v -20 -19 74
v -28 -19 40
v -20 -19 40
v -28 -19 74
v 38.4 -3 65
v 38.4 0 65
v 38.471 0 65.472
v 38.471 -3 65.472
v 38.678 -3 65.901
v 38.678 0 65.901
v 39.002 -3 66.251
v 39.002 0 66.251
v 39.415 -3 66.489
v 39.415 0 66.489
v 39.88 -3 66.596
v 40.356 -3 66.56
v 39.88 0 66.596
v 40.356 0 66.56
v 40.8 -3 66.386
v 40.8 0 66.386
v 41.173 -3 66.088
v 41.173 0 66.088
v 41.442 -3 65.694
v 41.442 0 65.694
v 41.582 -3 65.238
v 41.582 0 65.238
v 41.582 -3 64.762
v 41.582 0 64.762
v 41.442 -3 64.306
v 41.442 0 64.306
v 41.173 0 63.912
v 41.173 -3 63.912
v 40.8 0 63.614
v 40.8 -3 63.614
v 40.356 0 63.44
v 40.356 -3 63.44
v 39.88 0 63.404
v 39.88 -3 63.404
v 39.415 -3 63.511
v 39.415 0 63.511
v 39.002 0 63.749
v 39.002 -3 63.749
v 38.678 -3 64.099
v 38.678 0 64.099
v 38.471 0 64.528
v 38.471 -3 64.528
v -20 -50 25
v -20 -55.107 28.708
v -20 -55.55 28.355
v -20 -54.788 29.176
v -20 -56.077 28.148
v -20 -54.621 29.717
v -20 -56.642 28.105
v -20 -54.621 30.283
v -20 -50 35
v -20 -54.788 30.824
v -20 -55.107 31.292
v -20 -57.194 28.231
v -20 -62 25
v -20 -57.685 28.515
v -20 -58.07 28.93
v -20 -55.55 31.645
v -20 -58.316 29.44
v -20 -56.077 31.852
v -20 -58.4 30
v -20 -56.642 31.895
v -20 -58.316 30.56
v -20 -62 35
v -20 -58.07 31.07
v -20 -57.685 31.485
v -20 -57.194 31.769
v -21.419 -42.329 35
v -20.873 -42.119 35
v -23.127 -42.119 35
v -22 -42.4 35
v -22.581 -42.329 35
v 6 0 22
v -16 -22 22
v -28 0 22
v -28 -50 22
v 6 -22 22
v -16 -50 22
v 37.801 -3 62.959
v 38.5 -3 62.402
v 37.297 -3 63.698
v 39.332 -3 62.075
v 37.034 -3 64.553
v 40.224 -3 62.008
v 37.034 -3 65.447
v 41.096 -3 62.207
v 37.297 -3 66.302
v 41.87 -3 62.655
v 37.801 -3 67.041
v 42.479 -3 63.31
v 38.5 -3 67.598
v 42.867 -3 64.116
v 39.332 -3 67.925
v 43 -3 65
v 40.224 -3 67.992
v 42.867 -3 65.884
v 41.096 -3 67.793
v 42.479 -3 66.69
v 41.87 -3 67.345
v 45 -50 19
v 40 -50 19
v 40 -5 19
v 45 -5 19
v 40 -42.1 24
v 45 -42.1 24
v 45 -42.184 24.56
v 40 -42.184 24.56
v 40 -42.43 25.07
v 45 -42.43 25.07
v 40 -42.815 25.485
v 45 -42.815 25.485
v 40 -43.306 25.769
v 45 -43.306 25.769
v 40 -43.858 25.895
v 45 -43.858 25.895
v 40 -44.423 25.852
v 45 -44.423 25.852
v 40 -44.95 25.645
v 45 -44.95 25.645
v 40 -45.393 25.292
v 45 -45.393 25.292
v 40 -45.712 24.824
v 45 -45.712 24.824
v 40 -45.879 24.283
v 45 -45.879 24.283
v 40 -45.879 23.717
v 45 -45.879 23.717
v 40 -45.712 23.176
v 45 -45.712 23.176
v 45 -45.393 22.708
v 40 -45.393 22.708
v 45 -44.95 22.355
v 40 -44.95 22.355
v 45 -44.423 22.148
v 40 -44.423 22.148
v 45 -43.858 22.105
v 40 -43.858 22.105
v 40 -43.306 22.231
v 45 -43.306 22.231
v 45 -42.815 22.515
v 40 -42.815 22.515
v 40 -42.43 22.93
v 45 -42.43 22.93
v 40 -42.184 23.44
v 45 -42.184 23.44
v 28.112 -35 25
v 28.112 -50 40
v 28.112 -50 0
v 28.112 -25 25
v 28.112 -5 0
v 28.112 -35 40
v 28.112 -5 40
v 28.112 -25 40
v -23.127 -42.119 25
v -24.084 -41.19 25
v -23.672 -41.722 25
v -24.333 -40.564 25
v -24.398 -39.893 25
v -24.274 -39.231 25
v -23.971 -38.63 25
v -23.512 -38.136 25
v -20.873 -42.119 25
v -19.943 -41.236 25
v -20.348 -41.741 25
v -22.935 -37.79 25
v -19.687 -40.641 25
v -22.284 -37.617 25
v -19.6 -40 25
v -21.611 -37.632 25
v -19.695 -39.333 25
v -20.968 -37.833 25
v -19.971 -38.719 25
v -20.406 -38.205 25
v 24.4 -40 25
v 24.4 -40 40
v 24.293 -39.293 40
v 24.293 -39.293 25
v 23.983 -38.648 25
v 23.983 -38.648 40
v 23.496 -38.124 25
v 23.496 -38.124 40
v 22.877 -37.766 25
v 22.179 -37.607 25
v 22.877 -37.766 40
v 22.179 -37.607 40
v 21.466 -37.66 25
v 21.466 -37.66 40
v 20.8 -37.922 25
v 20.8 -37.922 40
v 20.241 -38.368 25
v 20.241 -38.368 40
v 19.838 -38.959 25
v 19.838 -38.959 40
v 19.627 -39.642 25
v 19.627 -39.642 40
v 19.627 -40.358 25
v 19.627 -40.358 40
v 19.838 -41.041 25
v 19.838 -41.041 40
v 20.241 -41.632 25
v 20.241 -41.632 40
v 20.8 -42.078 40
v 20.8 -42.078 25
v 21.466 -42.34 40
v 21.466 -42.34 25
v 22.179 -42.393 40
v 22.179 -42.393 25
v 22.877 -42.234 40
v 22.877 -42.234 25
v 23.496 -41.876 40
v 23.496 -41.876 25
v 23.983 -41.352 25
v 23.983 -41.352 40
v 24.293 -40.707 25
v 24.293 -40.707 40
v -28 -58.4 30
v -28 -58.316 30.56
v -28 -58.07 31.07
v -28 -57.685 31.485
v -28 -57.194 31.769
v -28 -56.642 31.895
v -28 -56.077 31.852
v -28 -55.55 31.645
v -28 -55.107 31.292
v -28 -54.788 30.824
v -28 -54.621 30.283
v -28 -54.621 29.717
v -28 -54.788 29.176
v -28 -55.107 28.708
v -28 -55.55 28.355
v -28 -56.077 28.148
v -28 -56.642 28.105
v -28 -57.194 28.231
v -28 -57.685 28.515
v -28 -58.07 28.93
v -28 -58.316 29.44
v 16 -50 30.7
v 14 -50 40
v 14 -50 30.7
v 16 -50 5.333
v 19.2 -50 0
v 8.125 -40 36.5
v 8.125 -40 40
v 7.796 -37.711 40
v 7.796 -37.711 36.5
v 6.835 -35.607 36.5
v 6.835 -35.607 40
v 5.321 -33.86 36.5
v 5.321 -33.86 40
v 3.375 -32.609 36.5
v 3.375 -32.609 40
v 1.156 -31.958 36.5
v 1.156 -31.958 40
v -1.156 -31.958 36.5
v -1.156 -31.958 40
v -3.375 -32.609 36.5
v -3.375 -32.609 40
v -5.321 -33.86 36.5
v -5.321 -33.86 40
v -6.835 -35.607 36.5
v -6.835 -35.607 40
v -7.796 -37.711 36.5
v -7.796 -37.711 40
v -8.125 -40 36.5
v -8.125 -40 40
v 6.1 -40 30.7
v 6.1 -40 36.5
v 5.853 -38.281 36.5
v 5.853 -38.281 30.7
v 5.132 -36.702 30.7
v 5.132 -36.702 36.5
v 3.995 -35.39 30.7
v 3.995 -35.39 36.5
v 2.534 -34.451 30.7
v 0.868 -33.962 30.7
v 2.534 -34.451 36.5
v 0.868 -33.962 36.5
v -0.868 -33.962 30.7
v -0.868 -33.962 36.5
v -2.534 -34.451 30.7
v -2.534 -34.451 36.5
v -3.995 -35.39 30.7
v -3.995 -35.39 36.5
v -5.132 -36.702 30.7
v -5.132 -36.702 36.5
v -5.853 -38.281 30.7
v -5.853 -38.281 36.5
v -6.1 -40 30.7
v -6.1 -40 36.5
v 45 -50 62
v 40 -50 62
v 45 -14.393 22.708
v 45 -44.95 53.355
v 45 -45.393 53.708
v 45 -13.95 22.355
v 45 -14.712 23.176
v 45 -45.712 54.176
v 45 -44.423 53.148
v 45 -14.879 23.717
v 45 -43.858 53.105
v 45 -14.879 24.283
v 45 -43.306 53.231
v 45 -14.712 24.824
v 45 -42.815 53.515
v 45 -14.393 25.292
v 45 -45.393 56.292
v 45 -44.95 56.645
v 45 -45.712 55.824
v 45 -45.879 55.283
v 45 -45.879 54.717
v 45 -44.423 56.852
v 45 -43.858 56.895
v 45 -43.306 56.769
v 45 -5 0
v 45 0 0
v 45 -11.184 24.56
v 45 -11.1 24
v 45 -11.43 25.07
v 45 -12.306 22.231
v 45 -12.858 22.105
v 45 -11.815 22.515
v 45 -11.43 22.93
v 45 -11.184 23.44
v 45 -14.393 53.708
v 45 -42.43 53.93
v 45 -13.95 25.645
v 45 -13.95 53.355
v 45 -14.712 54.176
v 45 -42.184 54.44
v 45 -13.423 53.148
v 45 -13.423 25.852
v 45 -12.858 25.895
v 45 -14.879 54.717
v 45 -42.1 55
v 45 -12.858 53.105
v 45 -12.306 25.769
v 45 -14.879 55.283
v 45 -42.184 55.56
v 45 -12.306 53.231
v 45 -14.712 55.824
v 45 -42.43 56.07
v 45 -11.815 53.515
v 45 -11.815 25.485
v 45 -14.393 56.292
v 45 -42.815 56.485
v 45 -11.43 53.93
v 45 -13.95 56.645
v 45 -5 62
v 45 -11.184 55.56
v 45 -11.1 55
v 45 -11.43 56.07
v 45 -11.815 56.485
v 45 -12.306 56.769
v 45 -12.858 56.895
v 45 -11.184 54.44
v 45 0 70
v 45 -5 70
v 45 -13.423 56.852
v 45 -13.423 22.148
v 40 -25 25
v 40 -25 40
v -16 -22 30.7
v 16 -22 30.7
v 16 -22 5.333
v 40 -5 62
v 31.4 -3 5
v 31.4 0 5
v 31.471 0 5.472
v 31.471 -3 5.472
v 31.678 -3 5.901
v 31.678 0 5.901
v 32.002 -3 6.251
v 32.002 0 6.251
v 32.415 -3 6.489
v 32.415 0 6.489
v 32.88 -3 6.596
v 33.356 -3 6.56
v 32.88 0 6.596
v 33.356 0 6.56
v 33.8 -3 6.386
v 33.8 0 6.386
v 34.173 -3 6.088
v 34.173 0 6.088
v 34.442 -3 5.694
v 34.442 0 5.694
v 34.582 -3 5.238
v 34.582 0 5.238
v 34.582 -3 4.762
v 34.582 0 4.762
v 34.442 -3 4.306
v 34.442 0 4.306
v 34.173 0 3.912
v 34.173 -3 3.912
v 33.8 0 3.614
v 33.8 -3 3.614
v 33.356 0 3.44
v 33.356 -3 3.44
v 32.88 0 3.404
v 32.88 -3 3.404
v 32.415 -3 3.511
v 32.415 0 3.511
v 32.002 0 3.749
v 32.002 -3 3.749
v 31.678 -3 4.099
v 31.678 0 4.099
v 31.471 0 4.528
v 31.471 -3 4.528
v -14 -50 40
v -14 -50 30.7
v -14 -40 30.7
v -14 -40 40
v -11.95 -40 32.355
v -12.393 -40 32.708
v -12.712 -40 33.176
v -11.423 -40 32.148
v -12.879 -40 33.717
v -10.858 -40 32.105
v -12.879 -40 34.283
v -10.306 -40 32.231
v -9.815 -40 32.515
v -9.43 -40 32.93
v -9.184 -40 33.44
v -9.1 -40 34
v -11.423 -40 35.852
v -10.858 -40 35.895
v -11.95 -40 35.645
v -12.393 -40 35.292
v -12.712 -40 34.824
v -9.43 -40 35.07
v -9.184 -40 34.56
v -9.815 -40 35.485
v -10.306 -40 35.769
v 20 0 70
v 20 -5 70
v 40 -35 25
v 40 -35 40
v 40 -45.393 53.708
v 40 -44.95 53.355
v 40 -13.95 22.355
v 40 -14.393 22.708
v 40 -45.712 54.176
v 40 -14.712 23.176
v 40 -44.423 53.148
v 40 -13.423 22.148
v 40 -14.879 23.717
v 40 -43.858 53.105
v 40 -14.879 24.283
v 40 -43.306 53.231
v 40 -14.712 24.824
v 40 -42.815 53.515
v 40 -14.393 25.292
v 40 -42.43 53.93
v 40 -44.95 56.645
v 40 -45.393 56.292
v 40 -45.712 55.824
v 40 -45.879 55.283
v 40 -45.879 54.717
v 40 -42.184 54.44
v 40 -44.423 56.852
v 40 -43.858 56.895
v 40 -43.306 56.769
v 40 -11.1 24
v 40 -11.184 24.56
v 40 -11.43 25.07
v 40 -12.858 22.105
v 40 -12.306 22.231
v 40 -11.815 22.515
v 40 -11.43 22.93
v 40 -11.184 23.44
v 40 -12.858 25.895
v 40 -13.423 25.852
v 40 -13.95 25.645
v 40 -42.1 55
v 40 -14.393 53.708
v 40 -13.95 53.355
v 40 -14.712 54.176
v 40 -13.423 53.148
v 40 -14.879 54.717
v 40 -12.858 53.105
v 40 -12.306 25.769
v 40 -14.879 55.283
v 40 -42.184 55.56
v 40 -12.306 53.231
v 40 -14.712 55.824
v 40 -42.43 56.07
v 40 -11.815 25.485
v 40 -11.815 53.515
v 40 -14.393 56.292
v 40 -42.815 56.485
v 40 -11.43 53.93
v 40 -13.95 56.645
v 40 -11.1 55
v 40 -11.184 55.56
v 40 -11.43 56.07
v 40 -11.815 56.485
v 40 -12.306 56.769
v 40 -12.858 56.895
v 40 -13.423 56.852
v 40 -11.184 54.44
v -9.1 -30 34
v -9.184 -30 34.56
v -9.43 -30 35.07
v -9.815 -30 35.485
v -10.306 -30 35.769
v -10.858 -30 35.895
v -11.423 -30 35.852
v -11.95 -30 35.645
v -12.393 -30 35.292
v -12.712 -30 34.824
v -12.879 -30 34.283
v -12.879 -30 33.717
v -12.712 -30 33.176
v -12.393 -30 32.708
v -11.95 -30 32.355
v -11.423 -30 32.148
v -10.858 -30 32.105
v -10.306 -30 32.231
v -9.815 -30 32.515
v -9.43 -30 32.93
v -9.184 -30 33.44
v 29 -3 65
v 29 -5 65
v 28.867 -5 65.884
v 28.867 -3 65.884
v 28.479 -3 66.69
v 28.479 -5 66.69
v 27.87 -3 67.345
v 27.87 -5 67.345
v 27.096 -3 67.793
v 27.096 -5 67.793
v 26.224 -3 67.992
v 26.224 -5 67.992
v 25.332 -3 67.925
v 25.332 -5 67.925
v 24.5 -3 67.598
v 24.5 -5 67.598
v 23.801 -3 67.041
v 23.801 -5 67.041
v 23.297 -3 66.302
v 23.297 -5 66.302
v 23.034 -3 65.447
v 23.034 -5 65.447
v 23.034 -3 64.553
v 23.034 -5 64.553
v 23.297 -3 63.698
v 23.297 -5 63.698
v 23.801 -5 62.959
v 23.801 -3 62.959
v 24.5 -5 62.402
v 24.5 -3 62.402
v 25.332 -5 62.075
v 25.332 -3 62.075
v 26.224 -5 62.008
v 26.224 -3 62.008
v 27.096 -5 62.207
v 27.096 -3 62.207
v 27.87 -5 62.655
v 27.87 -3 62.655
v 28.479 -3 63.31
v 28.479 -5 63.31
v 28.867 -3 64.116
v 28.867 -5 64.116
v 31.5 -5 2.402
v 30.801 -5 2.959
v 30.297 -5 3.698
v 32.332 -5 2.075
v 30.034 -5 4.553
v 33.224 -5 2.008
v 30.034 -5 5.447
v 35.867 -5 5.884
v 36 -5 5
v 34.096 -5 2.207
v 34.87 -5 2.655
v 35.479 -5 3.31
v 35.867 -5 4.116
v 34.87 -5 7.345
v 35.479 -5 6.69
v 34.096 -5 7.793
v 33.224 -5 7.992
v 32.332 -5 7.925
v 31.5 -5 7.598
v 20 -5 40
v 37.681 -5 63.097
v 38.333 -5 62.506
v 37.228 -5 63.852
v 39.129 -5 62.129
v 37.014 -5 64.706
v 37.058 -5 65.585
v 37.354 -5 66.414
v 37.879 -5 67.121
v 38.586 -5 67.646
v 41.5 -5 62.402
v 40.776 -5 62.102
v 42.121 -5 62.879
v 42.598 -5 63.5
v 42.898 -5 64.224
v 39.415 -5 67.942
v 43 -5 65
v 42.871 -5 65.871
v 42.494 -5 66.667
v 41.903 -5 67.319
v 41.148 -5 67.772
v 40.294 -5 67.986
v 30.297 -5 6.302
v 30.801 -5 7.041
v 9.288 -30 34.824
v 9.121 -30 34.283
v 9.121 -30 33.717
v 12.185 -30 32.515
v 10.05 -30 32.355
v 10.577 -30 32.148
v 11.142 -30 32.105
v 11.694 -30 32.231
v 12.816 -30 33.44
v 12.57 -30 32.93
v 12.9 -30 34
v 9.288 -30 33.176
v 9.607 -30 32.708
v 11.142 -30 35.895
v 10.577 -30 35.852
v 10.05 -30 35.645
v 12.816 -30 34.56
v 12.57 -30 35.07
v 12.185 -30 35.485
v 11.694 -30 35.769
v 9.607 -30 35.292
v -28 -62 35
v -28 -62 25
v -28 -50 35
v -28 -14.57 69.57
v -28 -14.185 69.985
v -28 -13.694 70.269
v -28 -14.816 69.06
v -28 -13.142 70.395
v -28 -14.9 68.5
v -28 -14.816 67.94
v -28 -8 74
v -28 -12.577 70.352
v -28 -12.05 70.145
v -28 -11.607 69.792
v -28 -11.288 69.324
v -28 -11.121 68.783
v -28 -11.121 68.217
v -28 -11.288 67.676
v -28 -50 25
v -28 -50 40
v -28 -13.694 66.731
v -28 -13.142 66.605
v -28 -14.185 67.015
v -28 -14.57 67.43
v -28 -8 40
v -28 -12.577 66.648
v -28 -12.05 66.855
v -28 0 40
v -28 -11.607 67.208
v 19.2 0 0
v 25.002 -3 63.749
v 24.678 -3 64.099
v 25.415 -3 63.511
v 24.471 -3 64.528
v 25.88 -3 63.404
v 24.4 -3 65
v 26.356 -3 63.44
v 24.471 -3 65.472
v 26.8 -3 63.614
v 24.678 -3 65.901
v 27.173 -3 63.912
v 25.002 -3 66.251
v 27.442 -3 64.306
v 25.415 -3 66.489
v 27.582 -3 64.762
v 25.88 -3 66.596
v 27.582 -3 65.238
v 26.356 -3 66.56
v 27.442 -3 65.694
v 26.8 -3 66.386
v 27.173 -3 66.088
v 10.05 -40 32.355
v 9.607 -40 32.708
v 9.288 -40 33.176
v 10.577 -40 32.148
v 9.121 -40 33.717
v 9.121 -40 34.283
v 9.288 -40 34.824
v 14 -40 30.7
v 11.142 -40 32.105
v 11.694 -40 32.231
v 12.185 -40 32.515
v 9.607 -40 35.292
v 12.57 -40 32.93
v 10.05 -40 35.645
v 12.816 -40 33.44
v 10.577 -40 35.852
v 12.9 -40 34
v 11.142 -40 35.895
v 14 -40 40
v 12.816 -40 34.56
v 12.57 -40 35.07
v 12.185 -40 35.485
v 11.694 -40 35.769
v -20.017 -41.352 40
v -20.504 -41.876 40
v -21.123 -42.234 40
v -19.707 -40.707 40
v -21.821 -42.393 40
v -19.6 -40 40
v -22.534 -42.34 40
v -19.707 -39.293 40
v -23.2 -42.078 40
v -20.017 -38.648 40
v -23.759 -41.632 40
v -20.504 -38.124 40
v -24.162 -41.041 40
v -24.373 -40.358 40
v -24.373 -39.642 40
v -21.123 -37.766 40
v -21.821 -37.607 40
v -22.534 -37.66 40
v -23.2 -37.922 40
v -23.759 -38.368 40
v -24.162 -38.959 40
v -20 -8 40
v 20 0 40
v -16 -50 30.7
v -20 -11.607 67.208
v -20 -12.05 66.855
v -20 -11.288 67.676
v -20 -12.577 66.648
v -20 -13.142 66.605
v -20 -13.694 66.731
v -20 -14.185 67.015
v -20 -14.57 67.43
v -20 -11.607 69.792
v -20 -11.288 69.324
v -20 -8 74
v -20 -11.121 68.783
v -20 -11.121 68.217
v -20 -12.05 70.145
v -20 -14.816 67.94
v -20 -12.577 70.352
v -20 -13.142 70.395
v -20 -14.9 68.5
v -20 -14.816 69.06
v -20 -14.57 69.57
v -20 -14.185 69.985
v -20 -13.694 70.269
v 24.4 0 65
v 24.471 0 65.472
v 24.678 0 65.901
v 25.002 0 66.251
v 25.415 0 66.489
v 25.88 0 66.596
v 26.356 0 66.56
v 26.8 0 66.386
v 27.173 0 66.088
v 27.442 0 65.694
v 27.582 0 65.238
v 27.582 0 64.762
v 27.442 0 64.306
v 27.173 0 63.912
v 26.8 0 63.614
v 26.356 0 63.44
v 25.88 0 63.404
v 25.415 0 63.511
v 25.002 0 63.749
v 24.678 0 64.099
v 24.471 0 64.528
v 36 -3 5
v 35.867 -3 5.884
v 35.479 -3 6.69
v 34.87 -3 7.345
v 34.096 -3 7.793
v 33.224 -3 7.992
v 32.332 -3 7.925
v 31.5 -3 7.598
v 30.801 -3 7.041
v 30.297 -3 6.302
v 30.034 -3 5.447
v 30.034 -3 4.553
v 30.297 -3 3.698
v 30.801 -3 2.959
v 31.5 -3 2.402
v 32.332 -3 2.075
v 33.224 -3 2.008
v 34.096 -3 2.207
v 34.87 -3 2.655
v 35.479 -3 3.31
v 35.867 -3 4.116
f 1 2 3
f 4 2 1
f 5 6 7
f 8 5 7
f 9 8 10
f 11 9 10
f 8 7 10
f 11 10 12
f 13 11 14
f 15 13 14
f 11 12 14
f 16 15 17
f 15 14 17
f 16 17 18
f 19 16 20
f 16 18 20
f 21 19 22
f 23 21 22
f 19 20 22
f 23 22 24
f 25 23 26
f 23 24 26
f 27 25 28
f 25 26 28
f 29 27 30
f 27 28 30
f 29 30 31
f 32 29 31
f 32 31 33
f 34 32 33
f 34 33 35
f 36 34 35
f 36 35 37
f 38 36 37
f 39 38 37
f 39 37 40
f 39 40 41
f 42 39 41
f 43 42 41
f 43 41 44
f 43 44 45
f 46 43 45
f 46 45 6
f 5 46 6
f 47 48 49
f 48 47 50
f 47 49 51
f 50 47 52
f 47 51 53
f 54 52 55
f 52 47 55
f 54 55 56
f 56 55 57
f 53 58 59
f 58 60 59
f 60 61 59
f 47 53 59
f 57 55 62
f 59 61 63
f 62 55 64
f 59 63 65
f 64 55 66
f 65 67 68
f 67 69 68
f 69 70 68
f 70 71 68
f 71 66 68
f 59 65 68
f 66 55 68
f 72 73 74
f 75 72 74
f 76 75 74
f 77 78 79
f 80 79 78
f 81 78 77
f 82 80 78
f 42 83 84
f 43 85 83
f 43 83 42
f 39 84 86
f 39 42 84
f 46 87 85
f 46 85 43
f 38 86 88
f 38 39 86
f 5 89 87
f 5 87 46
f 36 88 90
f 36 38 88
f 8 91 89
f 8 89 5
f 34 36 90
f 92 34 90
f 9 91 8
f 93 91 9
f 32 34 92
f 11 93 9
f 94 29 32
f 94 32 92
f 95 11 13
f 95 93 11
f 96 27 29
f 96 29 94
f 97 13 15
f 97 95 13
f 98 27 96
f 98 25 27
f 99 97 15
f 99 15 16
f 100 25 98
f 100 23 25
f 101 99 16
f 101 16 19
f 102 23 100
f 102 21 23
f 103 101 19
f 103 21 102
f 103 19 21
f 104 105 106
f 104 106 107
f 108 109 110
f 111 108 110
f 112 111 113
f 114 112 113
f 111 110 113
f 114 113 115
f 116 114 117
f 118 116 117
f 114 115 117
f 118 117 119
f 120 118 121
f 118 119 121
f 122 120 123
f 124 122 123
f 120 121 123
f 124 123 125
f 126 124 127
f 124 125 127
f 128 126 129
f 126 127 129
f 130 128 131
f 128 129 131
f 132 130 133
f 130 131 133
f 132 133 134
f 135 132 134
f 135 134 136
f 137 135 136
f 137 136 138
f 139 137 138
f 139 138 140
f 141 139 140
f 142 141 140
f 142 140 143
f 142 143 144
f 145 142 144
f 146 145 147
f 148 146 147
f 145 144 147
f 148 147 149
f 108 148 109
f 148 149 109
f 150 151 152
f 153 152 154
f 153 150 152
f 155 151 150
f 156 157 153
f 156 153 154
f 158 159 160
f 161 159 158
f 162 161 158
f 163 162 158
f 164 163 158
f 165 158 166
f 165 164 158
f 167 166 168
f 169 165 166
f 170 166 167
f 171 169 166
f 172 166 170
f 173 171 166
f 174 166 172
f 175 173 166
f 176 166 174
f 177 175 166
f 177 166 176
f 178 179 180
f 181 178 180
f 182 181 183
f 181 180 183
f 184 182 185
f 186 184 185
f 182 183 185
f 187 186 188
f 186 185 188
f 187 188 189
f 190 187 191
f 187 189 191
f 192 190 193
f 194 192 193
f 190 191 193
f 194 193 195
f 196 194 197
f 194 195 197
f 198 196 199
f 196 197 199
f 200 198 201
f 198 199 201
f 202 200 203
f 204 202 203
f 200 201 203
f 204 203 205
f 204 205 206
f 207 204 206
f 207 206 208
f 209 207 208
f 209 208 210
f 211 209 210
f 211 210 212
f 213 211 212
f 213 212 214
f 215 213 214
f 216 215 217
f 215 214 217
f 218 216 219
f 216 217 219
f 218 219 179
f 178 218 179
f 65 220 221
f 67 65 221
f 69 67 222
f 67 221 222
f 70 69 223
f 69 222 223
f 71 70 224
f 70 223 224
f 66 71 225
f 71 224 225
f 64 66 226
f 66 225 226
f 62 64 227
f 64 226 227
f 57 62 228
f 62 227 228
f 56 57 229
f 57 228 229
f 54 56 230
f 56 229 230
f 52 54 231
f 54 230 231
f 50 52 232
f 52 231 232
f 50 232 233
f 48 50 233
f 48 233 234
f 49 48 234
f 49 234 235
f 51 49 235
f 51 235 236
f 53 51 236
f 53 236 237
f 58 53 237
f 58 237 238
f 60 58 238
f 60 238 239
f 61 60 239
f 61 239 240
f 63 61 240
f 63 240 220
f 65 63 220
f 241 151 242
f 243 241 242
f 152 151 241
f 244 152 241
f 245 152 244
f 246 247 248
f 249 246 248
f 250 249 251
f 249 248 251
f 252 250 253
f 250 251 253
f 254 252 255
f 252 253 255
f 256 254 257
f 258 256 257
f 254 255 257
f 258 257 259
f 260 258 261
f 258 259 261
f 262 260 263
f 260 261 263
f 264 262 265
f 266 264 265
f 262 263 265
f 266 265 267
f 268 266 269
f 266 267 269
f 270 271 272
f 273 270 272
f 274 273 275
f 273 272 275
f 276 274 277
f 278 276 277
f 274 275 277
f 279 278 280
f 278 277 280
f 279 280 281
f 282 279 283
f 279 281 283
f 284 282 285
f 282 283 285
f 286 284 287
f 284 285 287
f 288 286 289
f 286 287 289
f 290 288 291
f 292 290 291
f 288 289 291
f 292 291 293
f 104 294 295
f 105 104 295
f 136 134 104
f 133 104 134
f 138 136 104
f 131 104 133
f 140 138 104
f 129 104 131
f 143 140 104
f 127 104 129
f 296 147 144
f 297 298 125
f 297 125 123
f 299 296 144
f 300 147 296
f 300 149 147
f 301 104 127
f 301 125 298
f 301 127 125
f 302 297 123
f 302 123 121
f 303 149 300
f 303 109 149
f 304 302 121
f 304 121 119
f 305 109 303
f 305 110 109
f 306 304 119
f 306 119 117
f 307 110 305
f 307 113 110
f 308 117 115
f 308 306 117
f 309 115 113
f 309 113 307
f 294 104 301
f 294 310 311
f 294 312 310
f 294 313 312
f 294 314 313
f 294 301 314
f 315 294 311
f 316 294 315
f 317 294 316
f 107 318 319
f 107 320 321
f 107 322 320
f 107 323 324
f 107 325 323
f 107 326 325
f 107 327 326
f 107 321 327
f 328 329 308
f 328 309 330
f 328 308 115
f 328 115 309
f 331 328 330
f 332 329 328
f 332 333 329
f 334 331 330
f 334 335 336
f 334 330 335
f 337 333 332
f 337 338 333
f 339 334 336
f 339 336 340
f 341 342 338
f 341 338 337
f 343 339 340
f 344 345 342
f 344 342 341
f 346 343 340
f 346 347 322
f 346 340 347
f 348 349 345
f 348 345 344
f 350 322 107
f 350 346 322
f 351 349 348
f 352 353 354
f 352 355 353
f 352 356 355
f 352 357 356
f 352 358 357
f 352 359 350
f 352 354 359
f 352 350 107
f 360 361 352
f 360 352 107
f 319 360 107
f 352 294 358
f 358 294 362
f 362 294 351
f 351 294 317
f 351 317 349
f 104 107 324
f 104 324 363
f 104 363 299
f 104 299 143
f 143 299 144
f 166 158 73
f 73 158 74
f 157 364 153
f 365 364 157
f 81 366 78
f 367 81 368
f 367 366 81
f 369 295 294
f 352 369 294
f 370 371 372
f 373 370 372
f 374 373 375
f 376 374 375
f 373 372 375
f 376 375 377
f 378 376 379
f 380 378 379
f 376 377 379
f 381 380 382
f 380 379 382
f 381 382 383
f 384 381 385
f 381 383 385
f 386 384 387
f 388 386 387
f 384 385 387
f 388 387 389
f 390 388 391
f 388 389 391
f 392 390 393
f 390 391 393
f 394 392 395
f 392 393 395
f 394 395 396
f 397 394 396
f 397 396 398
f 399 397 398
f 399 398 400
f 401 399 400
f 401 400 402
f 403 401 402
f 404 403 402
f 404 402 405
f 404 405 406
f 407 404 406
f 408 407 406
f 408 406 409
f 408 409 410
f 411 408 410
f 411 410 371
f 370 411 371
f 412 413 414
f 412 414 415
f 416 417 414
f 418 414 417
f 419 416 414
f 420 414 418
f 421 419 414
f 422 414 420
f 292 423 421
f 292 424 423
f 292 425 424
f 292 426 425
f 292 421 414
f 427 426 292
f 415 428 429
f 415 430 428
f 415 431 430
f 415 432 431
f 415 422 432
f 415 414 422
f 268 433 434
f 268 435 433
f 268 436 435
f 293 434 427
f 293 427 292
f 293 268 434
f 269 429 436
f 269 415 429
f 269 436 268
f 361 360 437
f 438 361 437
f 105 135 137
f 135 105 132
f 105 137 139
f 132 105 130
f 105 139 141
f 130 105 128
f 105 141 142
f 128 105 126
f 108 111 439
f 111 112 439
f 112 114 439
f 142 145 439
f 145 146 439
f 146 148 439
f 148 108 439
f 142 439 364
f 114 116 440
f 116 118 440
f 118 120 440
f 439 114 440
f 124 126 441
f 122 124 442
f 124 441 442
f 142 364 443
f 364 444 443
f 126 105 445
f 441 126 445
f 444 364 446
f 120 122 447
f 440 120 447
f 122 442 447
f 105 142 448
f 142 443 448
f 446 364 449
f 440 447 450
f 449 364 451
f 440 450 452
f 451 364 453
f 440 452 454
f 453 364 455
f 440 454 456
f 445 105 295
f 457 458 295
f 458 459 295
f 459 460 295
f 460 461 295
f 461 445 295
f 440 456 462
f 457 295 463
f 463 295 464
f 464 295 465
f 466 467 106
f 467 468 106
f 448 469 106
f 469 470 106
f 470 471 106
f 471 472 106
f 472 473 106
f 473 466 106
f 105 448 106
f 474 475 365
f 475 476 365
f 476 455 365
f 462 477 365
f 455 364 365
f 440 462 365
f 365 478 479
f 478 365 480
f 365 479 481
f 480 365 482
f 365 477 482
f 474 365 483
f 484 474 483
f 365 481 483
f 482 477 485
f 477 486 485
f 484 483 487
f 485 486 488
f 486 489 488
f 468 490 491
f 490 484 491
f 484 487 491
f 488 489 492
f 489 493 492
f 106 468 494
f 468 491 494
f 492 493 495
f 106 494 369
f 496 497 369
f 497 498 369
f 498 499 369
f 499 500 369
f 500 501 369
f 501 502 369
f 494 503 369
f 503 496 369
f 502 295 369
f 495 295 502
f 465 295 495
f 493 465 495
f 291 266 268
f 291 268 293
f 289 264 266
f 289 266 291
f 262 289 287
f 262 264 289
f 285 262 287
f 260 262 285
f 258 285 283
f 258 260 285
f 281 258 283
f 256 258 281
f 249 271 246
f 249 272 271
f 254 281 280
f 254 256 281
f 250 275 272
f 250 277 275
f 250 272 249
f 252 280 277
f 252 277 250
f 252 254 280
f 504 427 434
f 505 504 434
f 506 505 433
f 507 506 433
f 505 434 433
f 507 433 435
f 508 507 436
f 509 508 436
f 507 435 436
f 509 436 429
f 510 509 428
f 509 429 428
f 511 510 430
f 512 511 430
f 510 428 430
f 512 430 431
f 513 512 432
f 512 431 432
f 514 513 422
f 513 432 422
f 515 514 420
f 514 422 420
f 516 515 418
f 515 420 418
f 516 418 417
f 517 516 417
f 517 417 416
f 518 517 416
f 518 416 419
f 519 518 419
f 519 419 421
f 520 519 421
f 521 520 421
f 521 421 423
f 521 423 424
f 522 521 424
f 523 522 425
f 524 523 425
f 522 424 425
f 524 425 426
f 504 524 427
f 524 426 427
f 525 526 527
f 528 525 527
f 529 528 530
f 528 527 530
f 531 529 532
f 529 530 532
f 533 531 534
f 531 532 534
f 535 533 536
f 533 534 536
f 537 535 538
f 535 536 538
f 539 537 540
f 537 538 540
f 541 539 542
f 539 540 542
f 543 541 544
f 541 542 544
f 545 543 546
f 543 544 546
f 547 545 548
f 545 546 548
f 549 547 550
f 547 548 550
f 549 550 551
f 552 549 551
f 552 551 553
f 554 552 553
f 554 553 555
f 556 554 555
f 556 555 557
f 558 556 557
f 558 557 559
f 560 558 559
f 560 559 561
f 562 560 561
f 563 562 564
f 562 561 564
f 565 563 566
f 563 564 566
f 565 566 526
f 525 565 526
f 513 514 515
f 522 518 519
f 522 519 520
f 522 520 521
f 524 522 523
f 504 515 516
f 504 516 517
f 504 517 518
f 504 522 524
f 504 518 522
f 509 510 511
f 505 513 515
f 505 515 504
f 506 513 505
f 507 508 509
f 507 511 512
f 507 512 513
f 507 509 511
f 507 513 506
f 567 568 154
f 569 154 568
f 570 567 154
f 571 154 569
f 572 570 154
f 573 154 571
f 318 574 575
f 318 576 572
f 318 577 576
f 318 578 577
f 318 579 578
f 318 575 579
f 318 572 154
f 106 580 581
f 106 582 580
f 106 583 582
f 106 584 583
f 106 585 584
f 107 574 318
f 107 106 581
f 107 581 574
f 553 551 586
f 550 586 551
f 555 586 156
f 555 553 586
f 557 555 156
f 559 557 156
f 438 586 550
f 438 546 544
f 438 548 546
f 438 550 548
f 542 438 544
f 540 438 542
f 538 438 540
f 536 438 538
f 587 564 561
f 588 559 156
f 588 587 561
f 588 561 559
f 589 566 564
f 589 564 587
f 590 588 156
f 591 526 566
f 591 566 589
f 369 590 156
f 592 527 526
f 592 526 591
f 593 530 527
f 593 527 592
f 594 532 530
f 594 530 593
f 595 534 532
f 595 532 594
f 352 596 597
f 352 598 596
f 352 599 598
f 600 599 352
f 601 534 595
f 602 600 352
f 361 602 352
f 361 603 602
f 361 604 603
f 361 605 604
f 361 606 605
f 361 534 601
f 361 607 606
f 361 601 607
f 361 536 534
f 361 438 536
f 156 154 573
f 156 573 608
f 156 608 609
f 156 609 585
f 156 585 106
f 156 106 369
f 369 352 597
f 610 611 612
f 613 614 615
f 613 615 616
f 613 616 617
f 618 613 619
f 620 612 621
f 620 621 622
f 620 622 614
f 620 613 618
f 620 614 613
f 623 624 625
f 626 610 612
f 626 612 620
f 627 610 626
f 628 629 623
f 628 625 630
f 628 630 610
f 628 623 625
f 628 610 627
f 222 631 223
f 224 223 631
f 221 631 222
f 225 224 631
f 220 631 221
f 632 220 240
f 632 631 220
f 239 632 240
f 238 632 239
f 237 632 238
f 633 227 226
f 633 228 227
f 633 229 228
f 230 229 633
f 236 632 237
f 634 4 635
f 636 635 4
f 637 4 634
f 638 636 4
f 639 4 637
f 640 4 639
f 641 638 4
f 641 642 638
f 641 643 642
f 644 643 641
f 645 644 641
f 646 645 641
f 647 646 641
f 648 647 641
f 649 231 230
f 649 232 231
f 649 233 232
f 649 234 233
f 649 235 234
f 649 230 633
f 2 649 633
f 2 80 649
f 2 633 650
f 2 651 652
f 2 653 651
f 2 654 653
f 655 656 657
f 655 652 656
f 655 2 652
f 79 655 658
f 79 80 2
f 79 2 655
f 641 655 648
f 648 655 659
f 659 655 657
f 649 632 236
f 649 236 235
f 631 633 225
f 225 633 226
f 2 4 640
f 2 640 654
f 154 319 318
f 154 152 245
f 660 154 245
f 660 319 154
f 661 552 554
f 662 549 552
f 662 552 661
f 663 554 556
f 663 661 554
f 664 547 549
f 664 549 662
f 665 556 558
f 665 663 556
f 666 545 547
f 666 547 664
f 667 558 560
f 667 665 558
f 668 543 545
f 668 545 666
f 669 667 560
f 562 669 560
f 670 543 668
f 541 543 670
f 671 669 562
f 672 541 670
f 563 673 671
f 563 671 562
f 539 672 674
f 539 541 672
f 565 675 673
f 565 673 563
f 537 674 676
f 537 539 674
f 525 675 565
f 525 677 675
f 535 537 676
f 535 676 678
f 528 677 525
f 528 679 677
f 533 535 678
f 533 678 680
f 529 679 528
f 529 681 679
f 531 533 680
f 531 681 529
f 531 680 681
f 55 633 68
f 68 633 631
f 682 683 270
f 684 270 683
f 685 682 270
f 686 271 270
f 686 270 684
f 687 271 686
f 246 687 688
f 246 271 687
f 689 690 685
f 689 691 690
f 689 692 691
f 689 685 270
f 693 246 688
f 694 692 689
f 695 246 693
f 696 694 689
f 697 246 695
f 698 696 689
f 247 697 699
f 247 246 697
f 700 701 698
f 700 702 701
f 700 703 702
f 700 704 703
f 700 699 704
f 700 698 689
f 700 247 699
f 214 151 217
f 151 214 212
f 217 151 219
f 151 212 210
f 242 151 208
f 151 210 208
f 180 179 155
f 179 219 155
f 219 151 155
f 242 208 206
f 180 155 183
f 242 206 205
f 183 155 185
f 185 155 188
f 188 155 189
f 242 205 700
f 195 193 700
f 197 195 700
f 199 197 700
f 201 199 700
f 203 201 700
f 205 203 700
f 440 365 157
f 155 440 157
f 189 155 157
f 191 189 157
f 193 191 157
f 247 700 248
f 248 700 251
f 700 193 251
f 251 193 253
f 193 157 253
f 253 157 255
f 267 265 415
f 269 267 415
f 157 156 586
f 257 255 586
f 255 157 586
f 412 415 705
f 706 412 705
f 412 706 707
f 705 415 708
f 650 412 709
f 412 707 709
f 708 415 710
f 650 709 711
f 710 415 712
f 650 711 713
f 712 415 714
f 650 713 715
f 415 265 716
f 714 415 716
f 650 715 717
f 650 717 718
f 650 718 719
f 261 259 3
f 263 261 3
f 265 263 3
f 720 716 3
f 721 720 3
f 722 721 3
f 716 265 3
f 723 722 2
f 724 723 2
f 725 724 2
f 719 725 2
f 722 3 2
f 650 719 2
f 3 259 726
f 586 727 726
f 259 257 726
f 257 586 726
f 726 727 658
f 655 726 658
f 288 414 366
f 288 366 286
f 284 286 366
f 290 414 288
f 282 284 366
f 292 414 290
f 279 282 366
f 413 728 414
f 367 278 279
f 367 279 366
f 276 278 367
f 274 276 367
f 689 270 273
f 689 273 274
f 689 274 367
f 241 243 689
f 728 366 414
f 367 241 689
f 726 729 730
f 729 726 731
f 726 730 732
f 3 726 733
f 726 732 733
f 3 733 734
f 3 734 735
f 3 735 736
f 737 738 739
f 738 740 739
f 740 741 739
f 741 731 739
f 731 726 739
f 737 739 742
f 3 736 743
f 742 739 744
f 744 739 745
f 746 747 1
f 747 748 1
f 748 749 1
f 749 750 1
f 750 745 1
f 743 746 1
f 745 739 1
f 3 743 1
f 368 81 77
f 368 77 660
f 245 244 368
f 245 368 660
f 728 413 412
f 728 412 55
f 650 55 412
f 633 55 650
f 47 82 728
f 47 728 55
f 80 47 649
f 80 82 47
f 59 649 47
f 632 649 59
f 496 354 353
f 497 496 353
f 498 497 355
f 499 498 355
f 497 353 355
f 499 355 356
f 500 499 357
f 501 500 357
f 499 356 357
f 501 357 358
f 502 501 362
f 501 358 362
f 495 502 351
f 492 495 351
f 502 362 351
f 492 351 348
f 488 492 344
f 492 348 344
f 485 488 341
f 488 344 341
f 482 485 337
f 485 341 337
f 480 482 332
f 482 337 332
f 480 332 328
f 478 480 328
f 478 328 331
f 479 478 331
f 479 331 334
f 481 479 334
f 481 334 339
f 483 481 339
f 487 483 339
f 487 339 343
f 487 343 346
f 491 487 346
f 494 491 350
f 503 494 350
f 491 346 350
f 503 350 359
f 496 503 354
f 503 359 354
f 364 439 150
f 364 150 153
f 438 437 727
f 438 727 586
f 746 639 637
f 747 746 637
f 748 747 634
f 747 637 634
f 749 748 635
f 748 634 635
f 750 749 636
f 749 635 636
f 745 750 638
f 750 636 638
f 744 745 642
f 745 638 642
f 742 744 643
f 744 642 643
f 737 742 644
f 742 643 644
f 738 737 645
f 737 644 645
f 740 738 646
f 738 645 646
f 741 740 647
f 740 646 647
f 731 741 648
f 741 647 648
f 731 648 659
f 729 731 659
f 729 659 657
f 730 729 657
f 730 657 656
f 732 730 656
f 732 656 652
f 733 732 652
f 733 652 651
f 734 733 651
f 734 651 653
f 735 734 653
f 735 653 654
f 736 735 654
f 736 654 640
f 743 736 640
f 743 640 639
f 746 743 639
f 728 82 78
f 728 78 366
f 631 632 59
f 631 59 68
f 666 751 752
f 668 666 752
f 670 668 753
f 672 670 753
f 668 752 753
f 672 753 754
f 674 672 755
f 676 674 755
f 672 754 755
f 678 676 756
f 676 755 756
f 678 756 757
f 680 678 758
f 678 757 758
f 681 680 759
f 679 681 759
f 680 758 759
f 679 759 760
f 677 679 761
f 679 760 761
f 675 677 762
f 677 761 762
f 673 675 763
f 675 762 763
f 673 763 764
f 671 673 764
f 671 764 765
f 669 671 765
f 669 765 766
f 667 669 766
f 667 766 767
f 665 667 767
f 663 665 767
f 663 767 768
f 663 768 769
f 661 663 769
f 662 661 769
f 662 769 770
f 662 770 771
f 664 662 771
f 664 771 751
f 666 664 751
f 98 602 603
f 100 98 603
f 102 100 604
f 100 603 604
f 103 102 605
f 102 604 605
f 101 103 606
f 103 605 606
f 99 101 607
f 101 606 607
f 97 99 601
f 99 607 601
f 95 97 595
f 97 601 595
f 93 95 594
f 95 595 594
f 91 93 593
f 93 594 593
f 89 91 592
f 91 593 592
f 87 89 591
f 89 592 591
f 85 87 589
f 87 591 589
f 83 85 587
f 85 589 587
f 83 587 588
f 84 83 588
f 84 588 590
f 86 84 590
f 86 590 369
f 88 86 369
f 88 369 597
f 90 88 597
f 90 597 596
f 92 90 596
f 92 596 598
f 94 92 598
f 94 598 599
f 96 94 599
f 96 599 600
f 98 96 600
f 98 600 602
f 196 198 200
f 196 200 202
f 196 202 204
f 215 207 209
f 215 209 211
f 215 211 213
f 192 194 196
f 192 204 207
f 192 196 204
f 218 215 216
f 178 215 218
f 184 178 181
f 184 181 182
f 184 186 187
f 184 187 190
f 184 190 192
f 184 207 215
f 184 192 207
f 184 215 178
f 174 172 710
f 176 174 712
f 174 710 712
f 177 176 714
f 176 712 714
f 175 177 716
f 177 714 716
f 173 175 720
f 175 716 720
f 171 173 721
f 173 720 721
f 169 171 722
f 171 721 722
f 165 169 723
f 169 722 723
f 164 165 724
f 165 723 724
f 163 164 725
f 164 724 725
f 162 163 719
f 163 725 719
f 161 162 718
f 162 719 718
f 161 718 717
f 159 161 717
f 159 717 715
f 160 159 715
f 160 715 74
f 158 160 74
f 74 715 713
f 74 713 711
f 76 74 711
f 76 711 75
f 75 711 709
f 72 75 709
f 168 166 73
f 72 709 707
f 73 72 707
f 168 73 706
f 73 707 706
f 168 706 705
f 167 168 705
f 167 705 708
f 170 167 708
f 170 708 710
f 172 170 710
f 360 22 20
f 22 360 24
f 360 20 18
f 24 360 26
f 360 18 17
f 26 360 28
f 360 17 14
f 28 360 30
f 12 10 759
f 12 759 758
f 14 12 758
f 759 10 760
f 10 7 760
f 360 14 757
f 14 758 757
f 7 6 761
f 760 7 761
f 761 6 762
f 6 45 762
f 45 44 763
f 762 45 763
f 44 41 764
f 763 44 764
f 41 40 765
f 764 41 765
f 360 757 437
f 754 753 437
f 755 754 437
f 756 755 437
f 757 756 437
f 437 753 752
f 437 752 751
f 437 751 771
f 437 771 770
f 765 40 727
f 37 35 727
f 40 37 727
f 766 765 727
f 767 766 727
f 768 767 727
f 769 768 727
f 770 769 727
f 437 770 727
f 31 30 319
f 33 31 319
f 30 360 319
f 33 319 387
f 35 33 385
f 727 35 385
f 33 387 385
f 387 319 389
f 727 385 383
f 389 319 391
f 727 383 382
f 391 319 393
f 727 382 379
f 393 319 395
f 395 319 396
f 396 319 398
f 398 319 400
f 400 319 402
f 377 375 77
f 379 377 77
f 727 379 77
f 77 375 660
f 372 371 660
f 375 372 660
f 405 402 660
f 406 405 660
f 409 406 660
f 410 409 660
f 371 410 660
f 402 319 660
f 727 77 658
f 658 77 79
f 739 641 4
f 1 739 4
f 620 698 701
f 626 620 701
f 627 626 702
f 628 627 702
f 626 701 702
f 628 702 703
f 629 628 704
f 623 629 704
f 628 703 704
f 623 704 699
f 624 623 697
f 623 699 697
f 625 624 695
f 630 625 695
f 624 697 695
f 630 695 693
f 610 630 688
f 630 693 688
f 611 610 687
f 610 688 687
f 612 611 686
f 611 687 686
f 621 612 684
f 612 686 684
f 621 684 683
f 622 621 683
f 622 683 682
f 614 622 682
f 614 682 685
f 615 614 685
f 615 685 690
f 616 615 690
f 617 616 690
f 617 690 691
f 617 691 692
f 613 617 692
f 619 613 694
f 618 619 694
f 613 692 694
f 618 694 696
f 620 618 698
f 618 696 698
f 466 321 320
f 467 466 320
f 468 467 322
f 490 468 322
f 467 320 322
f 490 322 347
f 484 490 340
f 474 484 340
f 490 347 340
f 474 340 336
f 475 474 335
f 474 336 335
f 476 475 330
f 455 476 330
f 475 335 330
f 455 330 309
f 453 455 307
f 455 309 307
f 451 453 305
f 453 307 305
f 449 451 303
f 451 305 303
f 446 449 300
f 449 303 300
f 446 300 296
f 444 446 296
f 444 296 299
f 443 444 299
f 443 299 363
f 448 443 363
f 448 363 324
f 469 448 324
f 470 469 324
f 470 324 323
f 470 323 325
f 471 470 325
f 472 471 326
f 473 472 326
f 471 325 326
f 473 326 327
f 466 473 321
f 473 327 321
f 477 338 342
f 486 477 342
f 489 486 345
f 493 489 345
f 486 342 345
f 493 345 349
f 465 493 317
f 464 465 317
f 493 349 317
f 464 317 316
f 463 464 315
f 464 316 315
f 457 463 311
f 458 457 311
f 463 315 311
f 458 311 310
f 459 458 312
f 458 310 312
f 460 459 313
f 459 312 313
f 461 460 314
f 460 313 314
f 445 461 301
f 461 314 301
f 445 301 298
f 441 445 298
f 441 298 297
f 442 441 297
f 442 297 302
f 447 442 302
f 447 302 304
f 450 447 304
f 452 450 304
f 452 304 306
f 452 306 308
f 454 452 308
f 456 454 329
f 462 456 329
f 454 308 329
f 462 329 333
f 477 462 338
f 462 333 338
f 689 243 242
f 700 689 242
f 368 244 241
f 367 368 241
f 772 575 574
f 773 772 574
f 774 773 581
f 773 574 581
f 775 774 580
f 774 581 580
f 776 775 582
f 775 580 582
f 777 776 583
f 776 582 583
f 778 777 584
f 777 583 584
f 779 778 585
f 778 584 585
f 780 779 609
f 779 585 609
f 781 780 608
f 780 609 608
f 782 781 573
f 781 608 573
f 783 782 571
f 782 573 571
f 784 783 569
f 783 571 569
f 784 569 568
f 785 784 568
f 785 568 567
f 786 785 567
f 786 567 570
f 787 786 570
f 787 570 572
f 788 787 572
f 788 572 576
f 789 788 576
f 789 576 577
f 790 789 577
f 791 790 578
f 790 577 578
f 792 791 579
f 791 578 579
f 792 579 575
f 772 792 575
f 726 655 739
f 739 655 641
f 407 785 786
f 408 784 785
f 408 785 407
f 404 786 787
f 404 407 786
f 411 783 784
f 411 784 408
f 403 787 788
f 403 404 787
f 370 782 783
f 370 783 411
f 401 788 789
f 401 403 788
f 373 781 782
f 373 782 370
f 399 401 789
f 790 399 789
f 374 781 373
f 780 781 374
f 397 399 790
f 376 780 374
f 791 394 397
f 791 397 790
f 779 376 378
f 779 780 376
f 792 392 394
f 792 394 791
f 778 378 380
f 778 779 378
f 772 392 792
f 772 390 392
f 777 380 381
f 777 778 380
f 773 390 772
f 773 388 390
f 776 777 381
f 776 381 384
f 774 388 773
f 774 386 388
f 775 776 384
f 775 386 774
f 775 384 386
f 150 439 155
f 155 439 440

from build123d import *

# Parameters (mm, degrees)
PAD_DEPTH       = 70
SKETCH001_W     = 11.887794
SKETCH001_H     = 46.78
POCKET_DEPTH    = 70.001
POCKET001_DEPTH = 30
SKETCH003_R     = 2.4
POCKET002_DEPTH = 15
POCKET003_DEPTH = 3.5
POCKET004_DEPTH = 9
SKETCH021_W     = 28
SKETCH021_H     = 53.161749
POCKET005_DEPTH = 10
SKETCH022_W     = 32
SKETCH022_H     = 58.660217
POCKET006_DEPTH = 28
POCKET007_DEPTH = 51
SKETCH008_W     = 19.05323
SKETCH008_H     = 10.69447
SKETCH008_W_2   = 35.750058
SKETCH008_H_2   = 36.172176
POCKET008_DEPTH = 45
SKETCH009_R     = 1.9
POCKET009_DEPTH = 5
SKETCH015_W     = 11
SKETCH015_H     = 38.184422
SKETCH015_W_2   = 19.881198
SKETCH015_H_2   = 10
PAD001_DEPTH    = 8
SKETCH011_R     = 1.9
POCKET010_DEPTH = 10
SKETCH010_R     = 1.6
POCKET011_DEPTH = 7
SKETCH017_R     = 3
POCKET012_DEPTH = 2
SKETCH013_R     = 1.9
POCKET013_DEPTH = 10
SKETCH014_W     = 10
SKETCH014_H     = 15
PAD002_DEPTH    = 18


with BuildPart() as part:
    # Sketch → Pad (new body)
    with BuildSketch(Plane.XY):
        Polygon((0, 0), (45, 0), (45, -50), (-28, -50), (-28, 0), align=None)
    extrude(amount=PAD_DEPTH)

    # Sketch001 (on Face7 of Pad) → Pocket (cut, through all)
    with BuildSketch(Plane.XY.offset(70)):
        with Locations((34.056103, -28.39)):
            Rectangle(SKETCH001_W, SKETCH001_H)
    extrude(amount=-POCKET_DEPTH, mode=Mode.SUBTRACT)

    # Sketch002 (on Face5 of Pocket) → Pocket001 (cut)
    with BuildSketch(Plane.XY.offset(70)):
        Polygon((30, -5), (30, -65.096024), (-40.783405, -65.096024), (-40.783405, 12.994774), (20, 12.994774), (20, -5), align=None)
    extrude(amount=-POCKET001_DEPTH, mode=Mode.SUBTRACT)

    # Sketch003 (on Face6 of Pocket001) → Pocket002 (cut)
    with BuildSketch(Plane.XY.offset(40)):
        with Locations((-22, -40)):
            Circle(SKETCH003_R)
        with Locations((22, -40)):
            Circle(SKETCH003_R)
    extrude(amount=-POCKET002_DEPTH, mode=Mode.SUBTRACT)

    # Sketch004 (on Face6 of Pocket002) → Pocket003 (cut)
    with BuildSketch(Plane.XY.offset(40)):
        with BuildLine():
            ThreePointArc((8.125, -40), (0, -31.875), (-8.125, -40))
            Line((-8.125, -59.24), (-8.125, -40))
            Line((8.125, -59.24), (-8.125, -59.24))
            Line((8.125, -40), (8.125, -59.24))
        make_face()
    extrude(amount=-POCKET003_DEPTH, mode=Mode.SUBTRACT)

    # Sketch018 → Pocket004 (cut)
    with BuildSketch(Plane.XY.offset(36.5)):
        with BuildLine():
            ThreePointArc((6.1, -40), (0, -33.9), (-6.1, -40))
            Line((-6.1, -40), (-6.1, -50))
            Line((6.1, -50), (-6.1, -50))
            Line((6.1, -40), (6.1, -50))
        make_face()
    extrude(amount=-POCKET004_DEPTH, mode=Mode.SUBTRACT)

    # Sketch021 (on Face9 of Pocket004) → Pocket005 (cut)
    with BuildSketch(Plane.XZ.offset(50)):
        with Locations((0, 16.83664)):
            Rectangle(SKETCH021_W, SKETCH021_H)
    extrude(amount=-POCKET005_DEPTH, mode=Mode.SUBTRACT)

    # Sketch022 (on Face13 of Pocket005) → Pocket006 (cut)
    with BuildSketch(Plane.XZ.offset(50)):
        with Locations((0, 1.369891)):
            Rectangle(SKETCH022_W, SKETCH022_H)
    extrude(amount=-POCKET006_DEPTH, mode=Mode.SUBTRACT)

    # Sketch023 (on Face9 of Pocket006) → Pocket007 (cut)
    with BuildSketch(Plane.XZ.offset(50)):
        Polygon((-38.33, 22), (6, 22), (24, -8), (-38.33, -8), align=None)
    extrude(amount=-POCKET007_DEPTH, mode=Mode.SUBTRACT)

    # Sketch008 (on Face14 of Pocket007) → Pocket008 (cut)
    with BuildSketch(Plane.XZ.offset(50)):
        with Locations((44.142395, 67.347235)):
            Rectangle(SKETCH008_W, SKETCH008_H)
        with Locations((52.797694, 0.913912)):
            Rectangle(SKETCH008_W_2, SKETCH008_H_2)
    extrude(amount=-POCKET008_DEPTH, mode=Mode.SUBTRACT)

    # Sketch009 (on Face3 of Pocket008) → Pocket009 (cut)
    with BuildSketch(Plane.YZ.offset(45)):
        with Locations((-44, 55)):
            Circle(SKETCH009_R)
        with Locations((-13, 24)):
            Circle(SKETCH009_R)
        with Locations((-13, 55)):
            Circle(SKETCH009_R)
        with Locations((-44, 24)):
            Circle(SKETCH009_R)
    extrude(amount=-POCKET009_DEPTH, mode=Mode.SUBTRACT)

    # Sketch015 (on Face26 of Pocket009) → Pad001 (join)
    with BuildSketch(Plane(origin=(-28, 0, 0), x_dir=(0, -1, 0), z_dir=(-1, 0, 0))):
        with Locations((13.5, 54.907789)):
            Rectangle(SKETCH015_W, SKETCH015_H)
        with Locations((52.059401, 30)):
            Rectangle(SKETCH015_W_2, SKETCH015_H_2)
    extrude(amount=-PAD001_DEPTH)

    # Sketch011 (on Face26 of Pad001) → Pocket010 (cut)
    with BuildSketch(Plane(origin=(-28, 0, 0), x_dir=(0, -1, 0), z_dir=(-1, 0, 0))):
        with Locations((56.5, 30)):
            Circle(SKETCH011_R)
        with Locations((13, 68.5)):
            Circle(SKETCH011_R)
    extrude(amount=-POCKET010_DEPTH, mode=Mode.SUBTRACT)

    # Sketch010 (on Face1 of Pocket010) → Pocket011 (cut)
    with BuildSketch(Plane(origin=(0, 0, 0), x_dir=(-1, 0, 0), z_dir=(0, 1, 0))):
        with Locations((-33, 5)):
            Circle(SKETCH010_R)
        with Locations((-40, 65)):
            Circle(SKETCH010_R)
        with Locations((-26, 65)):
            Circle(SKETCH010_R)
    extrude(amount=-POCKET011_DEPTH, mode=Mode.SUBTRACT)

    # Sketch017 (on Face31 of Pocket011) → Pocket012 (cut)
    with BuildSketch(Plane.XZ.offset(5)):
        with Locations((26, 65)):
            Circle(SKETCH017_R)
        with Locations((33, 5)):
            Circle(SKETCH017_R)
        with Locations((40, 65)):
            Circle(SKETCH017_R)
    extrude(amount=-POCKET012_DEPTH, mode=Mode.SUBTRACT)

    # Sketch013 (on Face40 of Pocket012) → Pocket013 (cut)
    with BuildSketch(Plane.XZ.offset(40)):
        with Locations((-11, 34)):
            Circle(SKETCH013_R)
        with Locations((11, 34)):
            Circle(SKETCH013_R)
    extrude(amount=-POCKET013_DEPTH, mode=Mode.SUBTRACT)

    # Sketch014 (on Face4 of Pocket013) → Pad002 (join)
    with BuildSketch(Plane.YZ.offset(45)):
        with Locations((-30, 32.5)):
            Rectangle(SKETCH014_W, SKETCH014_H)
    extrude(amount=-PAD002_DEPTH)


solid = part.part
